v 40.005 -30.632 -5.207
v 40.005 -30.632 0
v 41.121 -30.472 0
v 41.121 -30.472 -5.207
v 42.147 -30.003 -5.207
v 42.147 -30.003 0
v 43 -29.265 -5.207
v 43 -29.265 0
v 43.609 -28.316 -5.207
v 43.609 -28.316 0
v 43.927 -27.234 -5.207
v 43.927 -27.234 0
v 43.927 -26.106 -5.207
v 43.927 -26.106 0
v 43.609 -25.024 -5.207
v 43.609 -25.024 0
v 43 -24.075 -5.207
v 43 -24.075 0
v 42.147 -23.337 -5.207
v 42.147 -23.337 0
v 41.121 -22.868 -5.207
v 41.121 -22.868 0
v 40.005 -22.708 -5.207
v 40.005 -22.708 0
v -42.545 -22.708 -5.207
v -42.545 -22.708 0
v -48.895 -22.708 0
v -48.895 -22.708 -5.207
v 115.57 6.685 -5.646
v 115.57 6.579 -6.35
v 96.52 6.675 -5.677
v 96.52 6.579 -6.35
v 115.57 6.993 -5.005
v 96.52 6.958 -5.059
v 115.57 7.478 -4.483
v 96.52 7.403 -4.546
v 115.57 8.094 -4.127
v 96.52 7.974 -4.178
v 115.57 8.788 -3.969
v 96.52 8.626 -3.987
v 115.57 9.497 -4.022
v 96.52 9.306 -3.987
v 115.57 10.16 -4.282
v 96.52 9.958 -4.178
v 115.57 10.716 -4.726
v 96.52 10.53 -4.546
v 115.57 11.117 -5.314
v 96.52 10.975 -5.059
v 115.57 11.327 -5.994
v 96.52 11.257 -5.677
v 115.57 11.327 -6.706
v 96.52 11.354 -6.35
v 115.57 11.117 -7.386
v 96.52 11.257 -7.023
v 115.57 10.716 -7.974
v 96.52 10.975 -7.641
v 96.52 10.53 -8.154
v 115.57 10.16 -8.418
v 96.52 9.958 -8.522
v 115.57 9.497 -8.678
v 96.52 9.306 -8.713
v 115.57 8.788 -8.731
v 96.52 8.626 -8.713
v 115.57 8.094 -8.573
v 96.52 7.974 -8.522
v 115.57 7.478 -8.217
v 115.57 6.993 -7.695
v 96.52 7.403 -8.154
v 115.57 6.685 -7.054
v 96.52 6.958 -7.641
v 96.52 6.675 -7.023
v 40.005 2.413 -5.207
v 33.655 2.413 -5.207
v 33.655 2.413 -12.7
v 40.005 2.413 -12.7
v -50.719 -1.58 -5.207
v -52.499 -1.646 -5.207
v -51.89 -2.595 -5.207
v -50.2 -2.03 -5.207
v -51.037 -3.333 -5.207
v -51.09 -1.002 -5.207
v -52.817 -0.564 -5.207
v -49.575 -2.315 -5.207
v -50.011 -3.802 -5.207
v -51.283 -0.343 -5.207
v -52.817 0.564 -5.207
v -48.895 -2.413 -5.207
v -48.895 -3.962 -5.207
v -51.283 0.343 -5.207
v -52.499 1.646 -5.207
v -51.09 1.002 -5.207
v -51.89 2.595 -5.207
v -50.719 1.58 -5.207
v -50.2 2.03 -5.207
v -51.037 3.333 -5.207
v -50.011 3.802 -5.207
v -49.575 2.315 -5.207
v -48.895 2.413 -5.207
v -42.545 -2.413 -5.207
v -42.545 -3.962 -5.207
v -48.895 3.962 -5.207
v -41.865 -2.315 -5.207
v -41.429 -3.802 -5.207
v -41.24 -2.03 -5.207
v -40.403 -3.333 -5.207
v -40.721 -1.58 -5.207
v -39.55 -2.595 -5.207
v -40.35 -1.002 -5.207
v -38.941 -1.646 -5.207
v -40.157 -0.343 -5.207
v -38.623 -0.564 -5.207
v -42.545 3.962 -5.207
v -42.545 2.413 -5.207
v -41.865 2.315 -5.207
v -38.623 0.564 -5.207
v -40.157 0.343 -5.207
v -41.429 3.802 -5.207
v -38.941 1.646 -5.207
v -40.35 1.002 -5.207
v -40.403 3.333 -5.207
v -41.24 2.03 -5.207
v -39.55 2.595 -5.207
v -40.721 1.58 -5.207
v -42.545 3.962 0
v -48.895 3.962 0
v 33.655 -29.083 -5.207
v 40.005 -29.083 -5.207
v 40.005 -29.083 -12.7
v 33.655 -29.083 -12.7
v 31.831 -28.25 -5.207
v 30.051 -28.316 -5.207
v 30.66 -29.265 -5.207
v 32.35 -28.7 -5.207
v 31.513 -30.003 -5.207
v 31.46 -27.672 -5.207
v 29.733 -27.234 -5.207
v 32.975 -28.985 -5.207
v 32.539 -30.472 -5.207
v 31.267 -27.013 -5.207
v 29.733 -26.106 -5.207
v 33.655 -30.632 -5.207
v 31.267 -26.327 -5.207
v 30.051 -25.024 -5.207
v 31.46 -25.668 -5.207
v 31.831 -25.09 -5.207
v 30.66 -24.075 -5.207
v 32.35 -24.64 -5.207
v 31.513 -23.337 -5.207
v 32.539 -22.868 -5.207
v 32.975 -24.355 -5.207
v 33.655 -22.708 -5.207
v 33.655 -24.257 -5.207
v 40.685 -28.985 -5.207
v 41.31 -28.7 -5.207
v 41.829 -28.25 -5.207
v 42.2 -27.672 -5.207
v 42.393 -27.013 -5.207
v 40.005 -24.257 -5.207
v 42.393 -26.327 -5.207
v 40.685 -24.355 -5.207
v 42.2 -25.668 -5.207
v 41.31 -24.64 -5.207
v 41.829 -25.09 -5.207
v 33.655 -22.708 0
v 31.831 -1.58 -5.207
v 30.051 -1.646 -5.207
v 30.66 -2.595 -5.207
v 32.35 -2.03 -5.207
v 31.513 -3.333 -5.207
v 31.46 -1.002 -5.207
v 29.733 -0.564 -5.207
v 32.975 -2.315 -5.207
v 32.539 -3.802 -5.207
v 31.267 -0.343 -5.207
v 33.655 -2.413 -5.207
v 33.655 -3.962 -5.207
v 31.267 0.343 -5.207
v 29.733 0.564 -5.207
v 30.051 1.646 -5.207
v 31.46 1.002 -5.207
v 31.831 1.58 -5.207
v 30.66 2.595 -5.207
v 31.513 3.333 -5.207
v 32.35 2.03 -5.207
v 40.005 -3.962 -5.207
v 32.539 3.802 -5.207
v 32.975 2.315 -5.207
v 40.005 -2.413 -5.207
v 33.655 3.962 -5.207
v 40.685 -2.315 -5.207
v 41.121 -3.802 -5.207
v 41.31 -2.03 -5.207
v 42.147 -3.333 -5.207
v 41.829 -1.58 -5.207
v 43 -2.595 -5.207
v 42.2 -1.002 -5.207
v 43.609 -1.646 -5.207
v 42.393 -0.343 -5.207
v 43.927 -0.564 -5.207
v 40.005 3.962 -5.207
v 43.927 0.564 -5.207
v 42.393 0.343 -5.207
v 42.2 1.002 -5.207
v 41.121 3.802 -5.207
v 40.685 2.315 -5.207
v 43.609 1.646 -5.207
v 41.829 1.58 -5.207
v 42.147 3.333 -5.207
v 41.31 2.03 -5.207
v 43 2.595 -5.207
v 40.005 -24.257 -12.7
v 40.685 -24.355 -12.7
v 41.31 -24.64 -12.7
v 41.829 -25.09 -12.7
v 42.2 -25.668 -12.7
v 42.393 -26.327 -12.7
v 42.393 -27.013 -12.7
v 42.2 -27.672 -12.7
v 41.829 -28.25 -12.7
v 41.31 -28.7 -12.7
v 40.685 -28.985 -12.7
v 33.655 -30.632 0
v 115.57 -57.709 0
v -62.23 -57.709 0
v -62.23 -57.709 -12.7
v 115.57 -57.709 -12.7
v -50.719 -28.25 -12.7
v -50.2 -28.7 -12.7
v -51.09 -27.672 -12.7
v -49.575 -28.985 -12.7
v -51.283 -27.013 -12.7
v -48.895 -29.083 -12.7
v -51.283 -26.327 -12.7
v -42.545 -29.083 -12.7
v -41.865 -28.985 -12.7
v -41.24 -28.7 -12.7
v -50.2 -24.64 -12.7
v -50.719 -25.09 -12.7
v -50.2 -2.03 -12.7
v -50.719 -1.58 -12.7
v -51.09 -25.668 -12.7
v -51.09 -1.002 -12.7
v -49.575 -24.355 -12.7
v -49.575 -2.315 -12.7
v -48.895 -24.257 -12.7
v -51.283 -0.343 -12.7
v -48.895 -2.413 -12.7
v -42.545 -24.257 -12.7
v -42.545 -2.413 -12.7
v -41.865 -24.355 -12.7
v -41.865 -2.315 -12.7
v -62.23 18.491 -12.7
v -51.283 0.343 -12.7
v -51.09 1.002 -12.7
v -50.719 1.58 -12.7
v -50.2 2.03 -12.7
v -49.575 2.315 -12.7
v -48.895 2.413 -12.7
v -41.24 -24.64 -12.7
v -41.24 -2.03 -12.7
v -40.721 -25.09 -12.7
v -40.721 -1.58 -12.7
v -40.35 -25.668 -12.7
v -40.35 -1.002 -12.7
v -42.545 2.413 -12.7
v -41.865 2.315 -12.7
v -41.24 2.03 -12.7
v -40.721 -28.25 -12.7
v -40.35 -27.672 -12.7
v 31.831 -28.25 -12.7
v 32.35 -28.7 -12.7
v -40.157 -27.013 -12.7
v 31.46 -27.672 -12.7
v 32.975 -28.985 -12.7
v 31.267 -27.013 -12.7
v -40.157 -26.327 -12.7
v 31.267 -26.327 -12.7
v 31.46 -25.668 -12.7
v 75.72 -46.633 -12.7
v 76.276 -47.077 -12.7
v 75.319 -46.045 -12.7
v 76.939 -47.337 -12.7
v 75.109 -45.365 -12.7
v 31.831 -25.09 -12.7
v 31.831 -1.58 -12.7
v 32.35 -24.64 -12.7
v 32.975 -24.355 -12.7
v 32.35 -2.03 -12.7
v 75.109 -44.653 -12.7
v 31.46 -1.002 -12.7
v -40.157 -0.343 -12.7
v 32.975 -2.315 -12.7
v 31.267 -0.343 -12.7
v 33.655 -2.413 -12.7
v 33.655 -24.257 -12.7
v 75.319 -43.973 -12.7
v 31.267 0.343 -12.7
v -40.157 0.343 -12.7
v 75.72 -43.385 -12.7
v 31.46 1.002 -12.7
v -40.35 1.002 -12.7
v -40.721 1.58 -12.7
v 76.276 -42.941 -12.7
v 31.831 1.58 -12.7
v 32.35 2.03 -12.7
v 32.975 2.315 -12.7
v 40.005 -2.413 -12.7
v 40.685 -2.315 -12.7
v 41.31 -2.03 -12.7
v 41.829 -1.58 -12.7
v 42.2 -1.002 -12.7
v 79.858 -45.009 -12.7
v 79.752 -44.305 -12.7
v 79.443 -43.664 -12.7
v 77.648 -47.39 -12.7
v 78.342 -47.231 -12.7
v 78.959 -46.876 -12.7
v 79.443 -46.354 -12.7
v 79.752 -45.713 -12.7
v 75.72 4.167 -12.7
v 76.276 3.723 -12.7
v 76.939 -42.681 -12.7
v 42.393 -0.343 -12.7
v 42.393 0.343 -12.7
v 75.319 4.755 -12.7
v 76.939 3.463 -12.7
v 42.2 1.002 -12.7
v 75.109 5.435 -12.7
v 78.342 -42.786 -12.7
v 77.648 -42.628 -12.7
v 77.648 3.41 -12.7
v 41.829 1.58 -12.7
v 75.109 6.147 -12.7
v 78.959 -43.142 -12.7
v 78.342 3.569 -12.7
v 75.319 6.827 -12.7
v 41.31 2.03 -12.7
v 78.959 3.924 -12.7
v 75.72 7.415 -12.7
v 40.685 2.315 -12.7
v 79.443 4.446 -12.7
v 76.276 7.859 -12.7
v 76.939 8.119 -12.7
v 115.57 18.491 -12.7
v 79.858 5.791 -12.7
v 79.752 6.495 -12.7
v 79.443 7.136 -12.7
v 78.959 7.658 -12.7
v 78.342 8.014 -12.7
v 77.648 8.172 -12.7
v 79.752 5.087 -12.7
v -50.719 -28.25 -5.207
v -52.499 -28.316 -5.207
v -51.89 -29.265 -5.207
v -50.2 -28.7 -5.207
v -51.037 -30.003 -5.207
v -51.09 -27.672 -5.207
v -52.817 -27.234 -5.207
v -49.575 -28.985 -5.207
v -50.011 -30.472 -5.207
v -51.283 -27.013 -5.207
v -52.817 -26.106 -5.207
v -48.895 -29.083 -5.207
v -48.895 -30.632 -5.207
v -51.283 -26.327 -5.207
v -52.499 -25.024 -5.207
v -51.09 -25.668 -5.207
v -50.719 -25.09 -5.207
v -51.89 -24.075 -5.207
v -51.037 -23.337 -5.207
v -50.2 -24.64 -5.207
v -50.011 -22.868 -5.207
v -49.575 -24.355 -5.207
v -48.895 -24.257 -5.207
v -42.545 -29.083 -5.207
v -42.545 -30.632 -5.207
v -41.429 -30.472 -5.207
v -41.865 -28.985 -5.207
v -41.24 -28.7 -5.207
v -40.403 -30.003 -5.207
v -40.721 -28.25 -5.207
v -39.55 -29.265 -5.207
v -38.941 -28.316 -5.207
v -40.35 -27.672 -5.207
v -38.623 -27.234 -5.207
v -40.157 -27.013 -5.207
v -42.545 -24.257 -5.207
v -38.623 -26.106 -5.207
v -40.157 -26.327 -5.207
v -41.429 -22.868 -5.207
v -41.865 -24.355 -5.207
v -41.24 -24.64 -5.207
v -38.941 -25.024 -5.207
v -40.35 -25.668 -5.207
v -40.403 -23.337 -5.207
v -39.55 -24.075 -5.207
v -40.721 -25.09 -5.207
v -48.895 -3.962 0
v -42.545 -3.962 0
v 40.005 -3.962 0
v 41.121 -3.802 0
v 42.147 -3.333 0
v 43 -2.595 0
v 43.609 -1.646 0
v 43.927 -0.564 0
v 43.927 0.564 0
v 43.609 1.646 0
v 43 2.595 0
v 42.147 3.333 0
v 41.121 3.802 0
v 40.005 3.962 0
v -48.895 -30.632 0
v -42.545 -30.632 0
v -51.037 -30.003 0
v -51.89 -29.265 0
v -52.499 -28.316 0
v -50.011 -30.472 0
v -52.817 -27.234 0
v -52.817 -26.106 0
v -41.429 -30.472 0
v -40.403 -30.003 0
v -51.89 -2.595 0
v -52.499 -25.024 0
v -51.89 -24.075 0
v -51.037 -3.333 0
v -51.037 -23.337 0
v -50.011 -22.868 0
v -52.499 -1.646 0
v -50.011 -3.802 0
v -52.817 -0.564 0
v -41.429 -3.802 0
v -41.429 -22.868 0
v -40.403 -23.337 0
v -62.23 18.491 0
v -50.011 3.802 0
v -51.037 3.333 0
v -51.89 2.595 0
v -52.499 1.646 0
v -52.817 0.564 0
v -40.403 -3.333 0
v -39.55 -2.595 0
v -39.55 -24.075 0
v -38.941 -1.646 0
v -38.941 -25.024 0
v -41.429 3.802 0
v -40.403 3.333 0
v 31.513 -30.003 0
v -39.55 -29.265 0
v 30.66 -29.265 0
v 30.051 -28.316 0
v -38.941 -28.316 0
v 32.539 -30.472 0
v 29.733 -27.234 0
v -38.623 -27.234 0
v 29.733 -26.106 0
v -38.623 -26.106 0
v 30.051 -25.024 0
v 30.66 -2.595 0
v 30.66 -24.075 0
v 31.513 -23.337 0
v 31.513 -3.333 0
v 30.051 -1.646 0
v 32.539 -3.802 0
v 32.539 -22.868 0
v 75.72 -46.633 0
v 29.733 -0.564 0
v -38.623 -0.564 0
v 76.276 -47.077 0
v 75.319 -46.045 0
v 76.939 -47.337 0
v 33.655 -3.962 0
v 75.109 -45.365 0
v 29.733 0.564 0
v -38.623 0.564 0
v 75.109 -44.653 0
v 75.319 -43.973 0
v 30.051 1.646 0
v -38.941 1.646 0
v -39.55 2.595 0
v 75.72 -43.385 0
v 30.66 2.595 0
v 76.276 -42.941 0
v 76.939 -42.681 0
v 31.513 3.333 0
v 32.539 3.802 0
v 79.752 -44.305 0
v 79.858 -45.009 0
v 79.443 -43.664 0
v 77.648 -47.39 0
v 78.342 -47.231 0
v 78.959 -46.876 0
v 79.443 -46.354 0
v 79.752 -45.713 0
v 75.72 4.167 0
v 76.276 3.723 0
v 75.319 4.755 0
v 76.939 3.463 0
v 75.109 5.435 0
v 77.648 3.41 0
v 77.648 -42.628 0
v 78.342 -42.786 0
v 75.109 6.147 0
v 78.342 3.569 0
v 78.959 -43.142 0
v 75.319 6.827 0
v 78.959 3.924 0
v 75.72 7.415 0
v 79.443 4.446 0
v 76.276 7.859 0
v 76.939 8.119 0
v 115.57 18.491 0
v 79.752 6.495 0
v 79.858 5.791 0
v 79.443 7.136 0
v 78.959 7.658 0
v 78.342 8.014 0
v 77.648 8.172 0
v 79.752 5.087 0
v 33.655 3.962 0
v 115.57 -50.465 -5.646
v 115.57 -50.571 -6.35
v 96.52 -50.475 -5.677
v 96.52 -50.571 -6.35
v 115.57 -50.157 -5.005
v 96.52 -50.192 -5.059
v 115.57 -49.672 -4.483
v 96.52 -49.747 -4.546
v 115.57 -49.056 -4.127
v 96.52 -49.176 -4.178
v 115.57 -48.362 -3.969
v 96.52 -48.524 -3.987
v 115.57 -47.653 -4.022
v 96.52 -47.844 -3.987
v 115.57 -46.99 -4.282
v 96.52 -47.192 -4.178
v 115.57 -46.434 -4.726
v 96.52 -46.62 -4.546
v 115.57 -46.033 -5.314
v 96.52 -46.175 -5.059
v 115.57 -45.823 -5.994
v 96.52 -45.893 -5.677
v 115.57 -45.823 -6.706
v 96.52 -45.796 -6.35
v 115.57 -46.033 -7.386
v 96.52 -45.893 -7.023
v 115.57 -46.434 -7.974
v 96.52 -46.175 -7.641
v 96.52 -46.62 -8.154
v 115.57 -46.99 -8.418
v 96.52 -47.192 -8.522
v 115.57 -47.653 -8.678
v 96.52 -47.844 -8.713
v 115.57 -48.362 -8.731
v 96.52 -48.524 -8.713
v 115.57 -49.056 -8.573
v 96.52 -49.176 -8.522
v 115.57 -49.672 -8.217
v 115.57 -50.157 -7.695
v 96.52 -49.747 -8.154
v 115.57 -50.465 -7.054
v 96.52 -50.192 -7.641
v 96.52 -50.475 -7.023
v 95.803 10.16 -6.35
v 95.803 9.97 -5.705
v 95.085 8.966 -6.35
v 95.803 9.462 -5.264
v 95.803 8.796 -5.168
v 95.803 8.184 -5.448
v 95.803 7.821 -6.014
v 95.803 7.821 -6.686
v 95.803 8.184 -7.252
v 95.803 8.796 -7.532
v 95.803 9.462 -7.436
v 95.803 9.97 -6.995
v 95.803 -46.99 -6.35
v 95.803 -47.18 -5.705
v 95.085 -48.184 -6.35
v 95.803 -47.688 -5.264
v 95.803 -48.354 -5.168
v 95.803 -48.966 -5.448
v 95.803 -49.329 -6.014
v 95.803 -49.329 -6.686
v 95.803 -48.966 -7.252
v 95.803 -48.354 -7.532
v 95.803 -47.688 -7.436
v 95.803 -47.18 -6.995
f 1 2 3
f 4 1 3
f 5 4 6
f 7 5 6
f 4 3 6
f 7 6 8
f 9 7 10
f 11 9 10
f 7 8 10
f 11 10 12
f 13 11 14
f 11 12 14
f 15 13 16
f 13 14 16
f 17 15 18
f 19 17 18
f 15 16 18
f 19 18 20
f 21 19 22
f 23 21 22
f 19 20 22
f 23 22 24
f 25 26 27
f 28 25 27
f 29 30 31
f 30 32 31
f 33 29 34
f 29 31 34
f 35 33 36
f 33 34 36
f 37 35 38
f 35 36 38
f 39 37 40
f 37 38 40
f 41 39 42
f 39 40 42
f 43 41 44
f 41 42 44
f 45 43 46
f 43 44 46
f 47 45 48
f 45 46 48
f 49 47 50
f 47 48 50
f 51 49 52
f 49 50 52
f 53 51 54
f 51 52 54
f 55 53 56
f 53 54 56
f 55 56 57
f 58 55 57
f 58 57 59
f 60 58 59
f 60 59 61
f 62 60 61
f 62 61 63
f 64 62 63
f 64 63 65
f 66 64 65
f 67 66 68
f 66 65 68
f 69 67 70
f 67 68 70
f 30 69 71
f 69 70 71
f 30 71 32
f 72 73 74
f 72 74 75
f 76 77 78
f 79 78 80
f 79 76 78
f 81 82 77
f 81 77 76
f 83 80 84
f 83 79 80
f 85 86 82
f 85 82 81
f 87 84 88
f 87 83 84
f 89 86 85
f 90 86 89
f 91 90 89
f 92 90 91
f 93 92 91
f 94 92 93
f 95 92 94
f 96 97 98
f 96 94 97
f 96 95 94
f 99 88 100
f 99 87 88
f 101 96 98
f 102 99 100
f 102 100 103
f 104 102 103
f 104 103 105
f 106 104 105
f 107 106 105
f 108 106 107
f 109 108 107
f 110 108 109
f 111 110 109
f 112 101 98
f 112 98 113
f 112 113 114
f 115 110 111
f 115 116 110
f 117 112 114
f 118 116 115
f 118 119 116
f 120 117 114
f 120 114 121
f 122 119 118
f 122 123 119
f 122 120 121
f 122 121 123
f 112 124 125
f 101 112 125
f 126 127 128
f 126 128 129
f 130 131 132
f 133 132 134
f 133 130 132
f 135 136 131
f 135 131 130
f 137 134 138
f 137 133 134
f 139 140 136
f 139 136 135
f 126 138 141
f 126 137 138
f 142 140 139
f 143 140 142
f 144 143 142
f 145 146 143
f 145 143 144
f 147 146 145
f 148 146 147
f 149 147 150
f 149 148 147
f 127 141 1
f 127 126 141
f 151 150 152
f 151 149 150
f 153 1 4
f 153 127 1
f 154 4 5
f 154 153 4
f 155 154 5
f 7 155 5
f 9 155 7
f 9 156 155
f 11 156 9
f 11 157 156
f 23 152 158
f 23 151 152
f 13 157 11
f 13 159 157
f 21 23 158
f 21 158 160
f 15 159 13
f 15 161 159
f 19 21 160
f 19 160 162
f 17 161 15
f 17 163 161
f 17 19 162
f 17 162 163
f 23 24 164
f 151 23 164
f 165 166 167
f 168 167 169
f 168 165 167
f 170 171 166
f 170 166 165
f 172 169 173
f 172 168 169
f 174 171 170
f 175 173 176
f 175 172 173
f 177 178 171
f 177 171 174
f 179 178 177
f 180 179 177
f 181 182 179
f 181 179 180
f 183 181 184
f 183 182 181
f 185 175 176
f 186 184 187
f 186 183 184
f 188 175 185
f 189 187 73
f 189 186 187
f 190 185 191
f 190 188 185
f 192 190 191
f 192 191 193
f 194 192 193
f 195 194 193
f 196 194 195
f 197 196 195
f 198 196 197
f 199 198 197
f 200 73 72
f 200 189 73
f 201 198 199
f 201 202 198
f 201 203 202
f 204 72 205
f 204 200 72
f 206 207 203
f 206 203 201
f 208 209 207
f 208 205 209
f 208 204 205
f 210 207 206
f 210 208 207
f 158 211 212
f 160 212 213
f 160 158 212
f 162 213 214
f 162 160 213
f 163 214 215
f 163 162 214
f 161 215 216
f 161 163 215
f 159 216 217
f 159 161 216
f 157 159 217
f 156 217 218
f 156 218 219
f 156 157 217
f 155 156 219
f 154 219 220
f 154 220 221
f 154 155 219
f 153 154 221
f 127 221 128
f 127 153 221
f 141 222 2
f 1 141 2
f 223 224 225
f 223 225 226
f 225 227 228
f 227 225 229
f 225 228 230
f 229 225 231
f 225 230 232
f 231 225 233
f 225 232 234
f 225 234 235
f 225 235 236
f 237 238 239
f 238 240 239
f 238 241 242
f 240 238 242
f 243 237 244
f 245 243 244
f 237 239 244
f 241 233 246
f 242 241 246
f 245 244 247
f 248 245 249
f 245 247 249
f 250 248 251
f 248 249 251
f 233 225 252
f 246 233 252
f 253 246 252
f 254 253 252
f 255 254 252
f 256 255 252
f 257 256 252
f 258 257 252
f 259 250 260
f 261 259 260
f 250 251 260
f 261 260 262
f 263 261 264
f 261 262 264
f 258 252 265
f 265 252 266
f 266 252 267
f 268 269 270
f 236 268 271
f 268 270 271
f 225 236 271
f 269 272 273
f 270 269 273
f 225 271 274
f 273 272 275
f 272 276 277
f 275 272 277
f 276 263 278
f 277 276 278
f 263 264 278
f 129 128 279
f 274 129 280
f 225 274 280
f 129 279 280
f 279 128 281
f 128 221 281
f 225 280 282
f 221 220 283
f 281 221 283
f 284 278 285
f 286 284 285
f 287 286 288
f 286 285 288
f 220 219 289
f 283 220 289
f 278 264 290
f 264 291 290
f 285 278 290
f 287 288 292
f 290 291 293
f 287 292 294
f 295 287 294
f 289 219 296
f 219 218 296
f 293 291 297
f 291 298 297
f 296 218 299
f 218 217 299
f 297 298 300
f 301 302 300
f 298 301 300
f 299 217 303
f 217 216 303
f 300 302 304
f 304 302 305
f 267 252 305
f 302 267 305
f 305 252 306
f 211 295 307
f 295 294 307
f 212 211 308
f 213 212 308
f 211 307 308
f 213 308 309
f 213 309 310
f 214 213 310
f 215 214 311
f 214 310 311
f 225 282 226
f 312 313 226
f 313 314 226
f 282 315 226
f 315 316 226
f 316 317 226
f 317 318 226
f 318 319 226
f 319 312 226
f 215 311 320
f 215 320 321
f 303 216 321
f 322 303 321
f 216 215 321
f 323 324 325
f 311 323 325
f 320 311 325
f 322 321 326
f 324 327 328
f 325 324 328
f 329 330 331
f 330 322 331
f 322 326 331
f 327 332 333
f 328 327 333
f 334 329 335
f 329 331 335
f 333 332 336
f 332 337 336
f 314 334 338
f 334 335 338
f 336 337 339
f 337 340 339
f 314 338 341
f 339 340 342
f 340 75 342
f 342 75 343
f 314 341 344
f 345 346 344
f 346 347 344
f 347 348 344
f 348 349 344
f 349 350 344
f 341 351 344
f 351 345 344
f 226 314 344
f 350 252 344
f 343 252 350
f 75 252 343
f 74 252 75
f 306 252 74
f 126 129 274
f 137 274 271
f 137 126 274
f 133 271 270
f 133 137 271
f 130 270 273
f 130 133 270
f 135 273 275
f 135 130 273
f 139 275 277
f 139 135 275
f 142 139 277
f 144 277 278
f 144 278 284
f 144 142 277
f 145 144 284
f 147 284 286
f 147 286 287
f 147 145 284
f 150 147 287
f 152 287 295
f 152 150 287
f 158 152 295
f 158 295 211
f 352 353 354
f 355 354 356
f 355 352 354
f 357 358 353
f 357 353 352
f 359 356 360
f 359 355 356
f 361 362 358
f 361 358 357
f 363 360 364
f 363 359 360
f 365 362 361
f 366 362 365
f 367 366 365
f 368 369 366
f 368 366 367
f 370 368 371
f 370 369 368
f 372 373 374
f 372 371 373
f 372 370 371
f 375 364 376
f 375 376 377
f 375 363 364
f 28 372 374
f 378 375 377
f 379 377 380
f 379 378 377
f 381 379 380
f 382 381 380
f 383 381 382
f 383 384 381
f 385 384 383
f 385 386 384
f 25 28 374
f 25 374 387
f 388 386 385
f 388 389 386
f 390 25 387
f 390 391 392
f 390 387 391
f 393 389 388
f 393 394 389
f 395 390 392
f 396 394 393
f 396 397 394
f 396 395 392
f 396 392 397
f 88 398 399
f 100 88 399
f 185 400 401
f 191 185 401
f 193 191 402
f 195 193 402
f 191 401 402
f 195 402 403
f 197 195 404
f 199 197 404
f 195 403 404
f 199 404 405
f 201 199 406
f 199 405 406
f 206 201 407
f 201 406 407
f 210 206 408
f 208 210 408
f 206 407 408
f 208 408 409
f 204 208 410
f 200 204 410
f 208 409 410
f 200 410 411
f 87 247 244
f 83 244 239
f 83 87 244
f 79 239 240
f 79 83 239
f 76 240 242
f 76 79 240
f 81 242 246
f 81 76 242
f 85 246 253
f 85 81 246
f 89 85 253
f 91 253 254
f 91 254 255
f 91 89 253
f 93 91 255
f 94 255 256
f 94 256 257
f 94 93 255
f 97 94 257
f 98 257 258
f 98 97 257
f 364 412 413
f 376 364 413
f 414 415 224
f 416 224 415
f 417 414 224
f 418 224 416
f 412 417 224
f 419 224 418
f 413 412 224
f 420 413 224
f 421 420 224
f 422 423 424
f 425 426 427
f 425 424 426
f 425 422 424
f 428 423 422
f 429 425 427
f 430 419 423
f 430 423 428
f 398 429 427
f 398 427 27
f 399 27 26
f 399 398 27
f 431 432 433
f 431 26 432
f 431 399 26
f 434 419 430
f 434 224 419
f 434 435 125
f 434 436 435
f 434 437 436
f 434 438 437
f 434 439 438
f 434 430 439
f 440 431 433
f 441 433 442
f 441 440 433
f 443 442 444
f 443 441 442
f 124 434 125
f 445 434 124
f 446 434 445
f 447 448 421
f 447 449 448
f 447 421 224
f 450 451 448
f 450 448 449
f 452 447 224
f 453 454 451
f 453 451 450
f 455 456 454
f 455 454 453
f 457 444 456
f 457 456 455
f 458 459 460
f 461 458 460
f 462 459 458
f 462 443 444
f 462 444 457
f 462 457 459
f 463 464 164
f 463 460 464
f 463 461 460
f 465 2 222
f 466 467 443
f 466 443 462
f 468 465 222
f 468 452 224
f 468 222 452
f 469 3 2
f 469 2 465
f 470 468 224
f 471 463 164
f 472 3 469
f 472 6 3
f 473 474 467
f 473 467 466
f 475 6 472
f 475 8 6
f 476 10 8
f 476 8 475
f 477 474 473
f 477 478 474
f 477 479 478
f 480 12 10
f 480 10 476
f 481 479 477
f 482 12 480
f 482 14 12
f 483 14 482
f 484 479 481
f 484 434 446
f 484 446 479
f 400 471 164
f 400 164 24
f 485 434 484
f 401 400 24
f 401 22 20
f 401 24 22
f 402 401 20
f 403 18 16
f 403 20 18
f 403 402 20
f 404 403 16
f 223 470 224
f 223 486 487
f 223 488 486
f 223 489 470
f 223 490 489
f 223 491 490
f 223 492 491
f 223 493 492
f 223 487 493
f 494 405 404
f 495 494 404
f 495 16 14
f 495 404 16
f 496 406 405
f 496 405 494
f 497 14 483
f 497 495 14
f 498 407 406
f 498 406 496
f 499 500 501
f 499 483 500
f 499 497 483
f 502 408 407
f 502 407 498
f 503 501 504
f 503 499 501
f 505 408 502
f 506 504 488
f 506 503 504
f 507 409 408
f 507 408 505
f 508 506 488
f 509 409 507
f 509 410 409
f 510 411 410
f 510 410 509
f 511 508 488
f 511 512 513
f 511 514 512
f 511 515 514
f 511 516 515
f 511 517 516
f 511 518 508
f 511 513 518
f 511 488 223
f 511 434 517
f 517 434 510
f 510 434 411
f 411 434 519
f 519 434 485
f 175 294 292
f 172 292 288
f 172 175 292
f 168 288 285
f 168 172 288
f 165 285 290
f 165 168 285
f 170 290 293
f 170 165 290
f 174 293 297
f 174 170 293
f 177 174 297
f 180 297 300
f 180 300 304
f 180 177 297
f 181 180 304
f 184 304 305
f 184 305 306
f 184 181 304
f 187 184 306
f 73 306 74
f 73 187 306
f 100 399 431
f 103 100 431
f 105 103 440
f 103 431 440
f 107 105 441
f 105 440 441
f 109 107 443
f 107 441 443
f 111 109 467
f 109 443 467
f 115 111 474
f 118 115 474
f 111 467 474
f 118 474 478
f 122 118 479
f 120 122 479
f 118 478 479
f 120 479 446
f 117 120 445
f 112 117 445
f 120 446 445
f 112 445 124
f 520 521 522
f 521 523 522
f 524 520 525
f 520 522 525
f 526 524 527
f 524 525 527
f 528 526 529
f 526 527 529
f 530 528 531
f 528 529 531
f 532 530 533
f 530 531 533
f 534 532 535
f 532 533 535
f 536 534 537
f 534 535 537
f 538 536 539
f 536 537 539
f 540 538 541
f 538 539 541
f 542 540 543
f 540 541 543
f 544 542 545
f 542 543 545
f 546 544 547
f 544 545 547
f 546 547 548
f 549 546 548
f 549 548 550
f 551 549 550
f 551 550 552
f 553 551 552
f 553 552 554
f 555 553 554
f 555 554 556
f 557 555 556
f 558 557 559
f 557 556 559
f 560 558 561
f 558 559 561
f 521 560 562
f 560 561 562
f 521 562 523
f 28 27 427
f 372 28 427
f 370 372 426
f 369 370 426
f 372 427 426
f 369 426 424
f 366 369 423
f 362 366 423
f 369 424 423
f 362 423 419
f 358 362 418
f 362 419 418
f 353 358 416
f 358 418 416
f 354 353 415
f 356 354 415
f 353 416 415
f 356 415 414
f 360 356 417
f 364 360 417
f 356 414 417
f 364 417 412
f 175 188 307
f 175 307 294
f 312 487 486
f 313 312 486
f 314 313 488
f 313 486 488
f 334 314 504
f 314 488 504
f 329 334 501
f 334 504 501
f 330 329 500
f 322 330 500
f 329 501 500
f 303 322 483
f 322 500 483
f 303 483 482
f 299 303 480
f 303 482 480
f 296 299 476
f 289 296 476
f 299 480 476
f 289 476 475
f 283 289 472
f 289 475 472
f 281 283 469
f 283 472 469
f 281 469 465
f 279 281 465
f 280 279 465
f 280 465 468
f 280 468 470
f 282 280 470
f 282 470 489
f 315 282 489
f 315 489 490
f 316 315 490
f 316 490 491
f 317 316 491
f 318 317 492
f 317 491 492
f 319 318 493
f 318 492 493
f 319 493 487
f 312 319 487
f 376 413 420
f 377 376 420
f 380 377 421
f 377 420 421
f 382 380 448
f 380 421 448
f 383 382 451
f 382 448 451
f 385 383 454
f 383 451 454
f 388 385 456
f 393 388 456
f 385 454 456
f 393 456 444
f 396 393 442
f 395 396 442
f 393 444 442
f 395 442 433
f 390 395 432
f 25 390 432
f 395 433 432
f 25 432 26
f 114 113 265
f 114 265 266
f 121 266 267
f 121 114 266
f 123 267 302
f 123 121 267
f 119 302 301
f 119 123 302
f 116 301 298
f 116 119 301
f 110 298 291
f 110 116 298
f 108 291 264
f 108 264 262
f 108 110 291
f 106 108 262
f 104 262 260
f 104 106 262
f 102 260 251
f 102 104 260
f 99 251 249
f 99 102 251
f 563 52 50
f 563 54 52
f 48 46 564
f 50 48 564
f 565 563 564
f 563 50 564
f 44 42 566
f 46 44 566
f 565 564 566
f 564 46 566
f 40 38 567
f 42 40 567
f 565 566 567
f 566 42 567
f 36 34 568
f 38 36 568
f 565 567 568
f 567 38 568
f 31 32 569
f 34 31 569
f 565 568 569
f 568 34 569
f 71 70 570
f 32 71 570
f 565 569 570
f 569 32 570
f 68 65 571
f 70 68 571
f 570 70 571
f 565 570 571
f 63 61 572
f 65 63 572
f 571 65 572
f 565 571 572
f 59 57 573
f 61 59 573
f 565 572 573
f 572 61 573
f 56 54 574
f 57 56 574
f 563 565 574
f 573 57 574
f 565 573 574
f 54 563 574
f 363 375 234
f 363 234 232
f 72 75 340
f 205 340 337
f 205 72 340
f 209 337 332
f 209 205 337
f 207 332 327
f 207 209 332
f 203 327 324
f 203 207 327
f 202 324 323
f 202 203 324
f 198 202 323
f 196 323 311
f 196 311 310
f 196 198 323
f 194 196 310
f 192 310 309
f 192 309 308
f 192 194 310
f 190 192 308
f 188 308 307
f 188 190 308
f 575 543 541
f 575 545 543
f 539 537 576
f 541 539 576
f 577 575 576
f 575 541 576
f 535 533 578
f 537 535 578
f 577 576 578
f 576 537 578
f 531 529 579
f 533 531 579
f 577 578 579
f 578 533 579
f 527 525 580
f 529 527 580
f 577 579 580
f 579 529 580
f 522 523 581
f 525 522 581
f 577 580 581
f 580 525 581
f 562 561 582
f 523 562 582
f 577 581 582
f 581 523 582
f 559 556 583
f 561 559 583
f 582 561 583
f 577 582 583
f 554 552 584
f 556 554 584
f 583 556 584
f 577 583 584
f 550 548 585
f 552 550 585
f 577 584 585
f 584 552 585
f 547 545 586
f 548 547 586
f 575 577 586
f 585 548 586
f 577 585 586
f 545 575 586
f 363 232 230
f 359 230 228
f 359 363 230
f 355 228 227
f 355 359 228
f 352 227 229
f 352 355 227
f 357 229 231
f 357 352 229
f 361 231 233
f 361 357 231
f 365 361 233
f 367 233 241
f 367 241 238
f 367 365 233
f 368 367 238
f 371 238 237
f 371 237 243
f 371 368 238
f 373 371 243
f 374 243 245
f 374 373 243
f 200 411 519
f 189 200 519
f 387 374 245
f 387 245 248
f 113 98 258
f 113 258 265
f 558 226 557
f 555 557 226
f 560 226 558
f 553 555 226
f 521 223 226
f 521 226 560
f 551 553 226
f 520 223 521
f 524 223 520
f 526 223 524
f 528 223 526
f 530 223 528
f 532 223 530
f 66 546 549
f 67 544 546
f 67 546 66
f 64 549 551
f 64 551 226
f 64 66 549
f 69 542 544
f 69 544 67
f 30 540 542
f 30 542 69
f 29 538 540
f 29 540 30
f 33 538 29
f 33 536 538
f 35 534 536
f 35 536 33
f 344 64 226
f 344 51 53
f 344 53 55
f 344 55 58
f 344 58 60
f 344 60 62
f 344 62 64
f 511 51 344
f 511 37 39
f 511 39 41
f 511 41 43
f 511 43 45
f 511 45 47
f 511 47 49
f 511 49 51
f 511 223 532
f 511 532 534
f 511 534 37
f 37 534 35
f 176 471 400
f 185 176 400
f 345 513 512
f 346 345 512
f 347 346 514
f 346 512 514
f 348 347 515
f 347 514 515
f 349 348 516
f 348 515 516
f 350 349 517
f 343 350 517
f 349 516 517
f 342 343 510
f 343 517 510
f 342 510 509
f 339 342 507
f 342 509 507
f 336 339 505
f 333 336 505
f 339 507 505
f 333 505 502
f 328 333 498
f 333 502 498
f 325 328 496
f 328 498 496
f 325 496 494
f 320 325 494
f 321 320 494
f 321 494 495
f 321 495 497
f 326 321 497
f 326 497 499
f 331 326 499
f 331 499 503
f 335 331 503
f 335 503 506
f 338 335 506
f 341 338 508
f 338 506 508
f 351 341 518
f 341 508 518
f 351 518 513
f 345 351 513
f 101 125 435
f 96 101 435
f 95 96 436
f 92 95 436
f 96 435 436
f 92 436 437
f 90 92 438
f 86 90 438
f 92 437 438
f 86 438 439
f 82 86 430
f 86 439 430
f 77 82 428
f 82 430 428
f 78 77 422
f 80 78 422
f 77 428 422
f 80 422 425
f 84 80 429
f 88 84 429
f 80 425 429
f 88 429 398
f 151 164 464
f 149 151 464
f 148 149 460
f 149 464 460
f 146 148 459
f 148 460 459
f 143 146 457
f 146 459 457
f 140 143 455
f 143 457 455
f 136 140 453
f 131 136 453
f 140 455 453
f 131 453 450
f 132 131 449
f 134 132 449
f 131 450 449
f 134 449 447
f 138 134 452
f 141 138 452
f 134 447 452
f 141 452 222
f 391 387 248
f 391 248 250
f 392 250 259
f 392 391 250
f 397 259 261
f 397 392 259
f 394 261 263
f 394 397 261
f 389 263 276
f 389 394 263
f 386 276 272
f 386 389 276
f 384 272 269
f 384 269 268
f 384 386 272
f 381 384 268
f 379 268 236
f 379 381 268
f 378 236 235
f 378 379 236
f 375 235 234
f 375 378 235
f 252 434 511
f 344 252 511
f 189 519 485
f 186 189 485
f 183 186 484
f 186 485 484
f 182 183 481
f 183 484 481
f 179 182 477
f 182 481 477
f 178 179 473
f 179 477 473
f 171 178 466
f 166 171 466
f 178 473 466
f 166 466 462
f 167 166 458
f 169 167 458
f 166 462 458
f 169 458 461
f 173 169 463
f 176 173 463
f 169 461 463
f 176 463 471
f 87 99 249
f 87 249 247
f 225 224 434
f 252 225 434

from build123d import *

# Parameters (mm, degrees)
F0_W     = 177.8
F0_H     = 76.2
F0_R     = 2.3876
F1_DEPTH = 12.7
F3_DEPTH = 5.207
F5_D     = 4.7752
F5_DEPTH = 19.05
F5_TIP   = 1.434614814


with BuildPart() as f1:
    # F0 (on Top) → F1 (new body)
    with BuildSketch(Plane.XY):
        with Locations((26.67, -19.6088)):
            Rectangle(F0_W, F0_H)
        with BuildLine():
            ThreePointArc((-48.895, -29.083), (-51.308, -26.67), (-48.895, -24.257))
            Line((-48.895, -24.257), (-42.545, -24.257))
            ThreePointArc((-42.545, -24.257), (-40.132, -26.67), (-42.545, -29.083))
            Line((-42.545, -29.083), (-48.895, -29.083))
        make_face(mode=Mode.SUBTRACT)
        with Locations((77.47, -45.0088)):
            Circle(F0_R, mode=Mode.SUBTRACT)
        with BuildLine():
            ThreePointArc((33.655, -29.083), (31.242, -26.67), (33.655, -24.257))
            Line((33.655, -24.257), (40.005, -24.257))
            ThreePointArc((40.005, -24.257), (42.418, -26.67), (40.005, -29.083))
            Line((40.005, -29.083), (33.655, -29.083))
        make_face(mode=Mode.SUBTRACT)
        with BuildLine():
            ThreePointArc((-48.895, -2.413), (-51.308, 0), (-48.895, 2.413))
            Line((-48.895, 2.413), (-42.545, 2.413))
            ThreePointArc((-42.545, 2.413), (-40.132, 0), (-42.545, -2.413))
            Line((-42.545, -2.413), (-48.895, -2.413))
        make_face(mode=Mode.SUBTRACT)
        with BuildLine():
            Line((40.005, -2.413), (33.655, -2.413))
            ThreePointArc((33.655, -2.413), (31.242, 0), (33.655, 2.413))
            Line((33.655, 2.413), (40.005, 2.413))
            ThreePointArc((40.005, 2.413), (42.418, 0), (40.005, -2.413))
        make_face(mode=Mode.SUBTRACT)
        with Locations((77.47, 5.7912)):
            Circle(F0_R, mode=Mode.SUBTRACT)
    extrude(amount=-F1_DEPTH)

    # F2 (on face) → F3 (cut)
    with BuildSketch(Plane.XY):
        with BuildLine():
            Line((-42.545, 3.9624), (-48.895, 3.9624))
            ThreePointArc((-48.895, 3.9624), (-52.8574, 0), (-48.895, -3.9624))
            Line((-48.895, -3.9624), (-42.545, -3.9624))
            ThreePointArc((-42.545, -3.9624), (-38.5826, 0), (-42.545, 3.9624))
        make_face()
        with BuildLine():
            Line((33.655, -3.9624), (40.005, -3.9624))
            ThreePointArc((40.005, -3.9624), (43.9674, 0), (40.005, 3.9624))
            Line((40.005, 3.9624), (33.655, 3.9624))
            ThreePointArc((33.655, 3.9624), (29.6926, 0), (33.655, -3.9624))
        make_face()
        with BuildLine():
            ThreePointArc((40.005, -30.6324), (43.9674, -26.67), (40.005, -22.7076))
            Line((40.005, -22.7076), (33.655, -22.7076))
            ThreePointArc((33.655, -22.7076), (29.6926, -26.67), (33.655, -30.6324))
            Line((33.655, -30.6324), (40.005, -30.6324))
        make_face()
        with BuildLine():
            Line((-42.545, -22.7076), (-48.895, -22.7076))
            ThreePointArc((-48.895, -22.7076), (-52.8574, -26.67), (-48.895, -30.6324))
            Line((-48.895, -30.6324), (-42.545, -30.6324))
            ThreePointArc((-42.545, -30.6324), (-38.5826, -26.67), (-42.545, -22.7076))
        make_face()
    extrude(amount=-F3_DEPTH, mode=Mode.SUBTRACT)

    # F5
    with Locations(Plane.YZ.offset(115.57)):
        with Locations((-48.1838, -6.35), (8.9662, -6.35)):
            Hole(F5_D / 2, depth=F5_DEPTH)
            with Locations((0, 0, -(F5_DEPTH + F5_TIP / 2))):  # 118° drill point
                Cone(0, F5_D / 2, F5_TIP, mode=Mode.SUBTRACT)


solid = f1.part
